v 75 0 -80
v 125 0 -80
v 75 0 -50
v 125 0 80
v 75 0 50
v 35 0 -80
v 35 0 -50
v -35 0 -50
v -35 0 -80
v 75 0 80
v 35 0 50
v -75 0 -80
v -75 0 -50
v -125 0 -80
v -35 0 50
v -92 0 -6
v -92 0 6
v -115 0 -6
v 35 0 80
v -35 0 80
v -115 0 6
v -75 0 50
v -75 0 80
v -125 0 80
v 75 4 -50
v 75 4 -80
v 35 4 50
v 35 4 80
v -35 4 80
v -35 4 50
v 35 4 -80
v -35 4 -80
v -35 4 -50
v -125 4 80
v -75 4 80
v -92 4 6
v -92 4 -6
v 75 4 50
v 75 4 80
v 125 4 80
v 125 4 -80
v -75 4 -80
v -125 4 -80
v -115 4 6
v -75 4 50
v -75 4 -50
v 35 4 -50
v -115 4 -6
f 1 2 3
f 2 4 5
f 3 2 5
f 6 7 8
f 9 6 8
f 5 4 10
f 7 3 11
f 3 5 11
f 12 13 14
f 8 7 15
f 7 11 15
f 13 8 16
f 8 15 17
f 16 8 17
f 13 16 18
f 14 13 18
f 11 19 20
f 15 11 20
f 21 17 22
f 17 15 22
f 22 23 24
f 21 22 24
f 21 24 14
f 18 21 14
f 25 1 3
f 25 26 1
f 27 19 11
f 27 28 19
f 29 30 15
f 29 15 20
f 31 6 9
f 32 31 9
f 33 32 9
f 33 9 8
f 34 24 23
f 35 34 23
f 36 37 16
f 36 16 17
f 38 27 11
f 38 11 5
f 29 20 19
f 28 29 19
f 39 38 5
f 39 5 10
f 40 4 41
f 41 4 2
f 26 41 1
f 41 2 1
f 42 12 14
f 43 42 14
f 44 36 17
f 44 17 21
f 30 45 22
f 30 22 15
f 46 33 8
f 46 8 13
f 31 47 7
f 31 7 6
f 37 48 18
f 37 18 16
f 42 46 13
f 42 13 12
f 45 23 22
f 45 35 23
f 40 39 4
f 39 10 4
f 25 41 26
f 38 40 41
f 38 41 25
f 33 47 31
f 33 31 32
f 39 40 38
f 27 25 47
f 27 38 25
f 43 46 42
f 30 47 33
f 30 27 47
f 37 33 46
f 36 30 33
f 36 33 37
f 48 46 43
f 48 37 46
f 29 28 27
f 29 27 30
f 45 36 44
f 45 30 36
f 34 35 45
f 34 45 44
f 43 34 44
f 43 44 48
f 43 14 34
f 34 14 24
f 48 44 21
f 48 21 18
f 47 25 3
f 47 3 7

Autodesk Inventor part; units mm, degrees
ref_plane "YZ Plane" through (0, 0, 0) normal (1, 0, 0) x (0, 1, 0)
ref_plane "XZ Plane" through (0, 0, 0) normal (0, 1, 0) x (-1, 0, 0)
ref_plane "XY Plane" through (0, 0, 0) normal (0, 0, 1) x (1, 0, 0)
sketch "Sketch1" plane through (0, 0, 0) normal (0, 1, 0) x (-1, 0, 0)
  point P0 (0, 0)
sketch "Sketch2" plane through (0, 0, 0) normal (0, 1, 0) x (-1, 0, 0)
  line L0 (125, 80) -> (-125, 80)
  line L1 (-125, 80) -> (-125, -80)
  line L2 (-125, -80) -> (125, -80)
  line L3 (125, -80) -> (125, 80)
  point P0 (0, 0)
  dimension "d0" = 250
  dimension "d1" = 160
  dimension "d2" = 80
  dimension "d3" = 125
extrude "Extrusion1" add sketch "Sketch2" along normal blind 4
sketch "Sketch3" plane through (0, 4, 0) normal (0, 1, 0) x (1, 0, 0)
  line L0 (-75, 80) -> (-35, 80)
  line L1 (-35, 80) -> (-35, 50)
  line L2 (-35, 50) -> (-75, 50)
  line L3 (-75, 50) -> (-75, 80)
  line L4 (125, 80) -> (-125, 80) projected
  line L5 (35, 80) -> (75, 80)
  line L6 (75, 80) -> (75, 50)
  line L7 (75, 50) -> (35, 50)
  line L8 (35, 50) -> (35, 80)
  line L9 (319.9785, -5.3403) -> (359.9785, -5.3403)
  line L10 (359.9785, -5.3403) -> (359.9785, -35.3403)
  line L11 (359.9785, -35.3403) -> (319.9785, -35.3403)
  line L12 (319.9785, -35.3403) -> (319.9785, -5.3403)
  line L13 (-75, -50) -> (-35, -50)
  line L14 (-35, -50) -> (-35, -80)
  line L15 (-35, -80) -> (-75, -80)
  line L16 (-75, -80) -> (-75, -50)
  line L17 (35, -50) -> (75, -50)
  line L18 (75, -50) -> (75, -80)
  line L19 (75, -80) -> (35, -80)
  line L20 (35, -80) -> (35, -50)
  line L21 (-125, -80) -> (125, -80) projected
  line L22 (-125, 80) -> (-125, -80) projected
  line L23 (-115, 6) -> (-92, 6)
  line L24 (-92, 6) -> (-92, -6)
  line L25 (-92, -6) -> (-115, -6)
  line L26 (-115, -6) -> (-115, 6)
  point P0 (0, 0)
  point P1 (-35, 65)
  point P2 (-75, 65)
  point P3 (-55, 80)
  point P4 (75, 65)
  point P5 (160.9592, -18.931)
  point P6 (359.9785, -20.3403)
  point P7 (72.8179, -60.7416)
  point P8 (-35, -65)
  point P9 (-133.4102, -90.6871)
  point P10 (75, -65)
  point P11 (55, 80)
  point P12 (35, 65)
  point P13 (35, -65)
  point P14 (55, -80)
  point P15 (-75, -65)
  point P16 (-103.5, -6)
  point P17 (-103.5, 6)
  point P18 (-115, 0)
  point P19 (-92, 0)
  point P20 (-125, 0)
  dimension "d6" = 30
  dimension "d7" = 40
  dimension "d8" = 35
  dimension "d9" = 0
  dimension "d10" = 40
  dimension "d11" = 30
  dimension "d12" = 40
  dimension "d13" = 30
  dimension "d14" = 40
  dimension "d15" = 30
  dimension "d16" = 40
  dimension "d17" = 30
  dimension "d18" = 0
  dimension "d19" = 35
  dimension "d20" = 35
  dimension "d21" = 0
  dimension "d22" = 50
  dimension "d23" = 0
  dimension "d24" = 12
  dimension "d25" = 0
  dimension "d26" = 23
  dimension "d27" = 10
extrude "Extrusion2" cut sketch "Sketch3" against normal blind 10 contours L4 L6 L7 L8 | L0 L1 L2 L3 | L20 L17 L18 L19 | L16 L13 L14 L15 | L23 L24 L25 L26
sketch "Sketch4" plane through (0, 4, 0) normal (0, 1, 0) x (1, 0, 0)
  point P0 (0, 0)
properties part number "Acrylic bottom"
